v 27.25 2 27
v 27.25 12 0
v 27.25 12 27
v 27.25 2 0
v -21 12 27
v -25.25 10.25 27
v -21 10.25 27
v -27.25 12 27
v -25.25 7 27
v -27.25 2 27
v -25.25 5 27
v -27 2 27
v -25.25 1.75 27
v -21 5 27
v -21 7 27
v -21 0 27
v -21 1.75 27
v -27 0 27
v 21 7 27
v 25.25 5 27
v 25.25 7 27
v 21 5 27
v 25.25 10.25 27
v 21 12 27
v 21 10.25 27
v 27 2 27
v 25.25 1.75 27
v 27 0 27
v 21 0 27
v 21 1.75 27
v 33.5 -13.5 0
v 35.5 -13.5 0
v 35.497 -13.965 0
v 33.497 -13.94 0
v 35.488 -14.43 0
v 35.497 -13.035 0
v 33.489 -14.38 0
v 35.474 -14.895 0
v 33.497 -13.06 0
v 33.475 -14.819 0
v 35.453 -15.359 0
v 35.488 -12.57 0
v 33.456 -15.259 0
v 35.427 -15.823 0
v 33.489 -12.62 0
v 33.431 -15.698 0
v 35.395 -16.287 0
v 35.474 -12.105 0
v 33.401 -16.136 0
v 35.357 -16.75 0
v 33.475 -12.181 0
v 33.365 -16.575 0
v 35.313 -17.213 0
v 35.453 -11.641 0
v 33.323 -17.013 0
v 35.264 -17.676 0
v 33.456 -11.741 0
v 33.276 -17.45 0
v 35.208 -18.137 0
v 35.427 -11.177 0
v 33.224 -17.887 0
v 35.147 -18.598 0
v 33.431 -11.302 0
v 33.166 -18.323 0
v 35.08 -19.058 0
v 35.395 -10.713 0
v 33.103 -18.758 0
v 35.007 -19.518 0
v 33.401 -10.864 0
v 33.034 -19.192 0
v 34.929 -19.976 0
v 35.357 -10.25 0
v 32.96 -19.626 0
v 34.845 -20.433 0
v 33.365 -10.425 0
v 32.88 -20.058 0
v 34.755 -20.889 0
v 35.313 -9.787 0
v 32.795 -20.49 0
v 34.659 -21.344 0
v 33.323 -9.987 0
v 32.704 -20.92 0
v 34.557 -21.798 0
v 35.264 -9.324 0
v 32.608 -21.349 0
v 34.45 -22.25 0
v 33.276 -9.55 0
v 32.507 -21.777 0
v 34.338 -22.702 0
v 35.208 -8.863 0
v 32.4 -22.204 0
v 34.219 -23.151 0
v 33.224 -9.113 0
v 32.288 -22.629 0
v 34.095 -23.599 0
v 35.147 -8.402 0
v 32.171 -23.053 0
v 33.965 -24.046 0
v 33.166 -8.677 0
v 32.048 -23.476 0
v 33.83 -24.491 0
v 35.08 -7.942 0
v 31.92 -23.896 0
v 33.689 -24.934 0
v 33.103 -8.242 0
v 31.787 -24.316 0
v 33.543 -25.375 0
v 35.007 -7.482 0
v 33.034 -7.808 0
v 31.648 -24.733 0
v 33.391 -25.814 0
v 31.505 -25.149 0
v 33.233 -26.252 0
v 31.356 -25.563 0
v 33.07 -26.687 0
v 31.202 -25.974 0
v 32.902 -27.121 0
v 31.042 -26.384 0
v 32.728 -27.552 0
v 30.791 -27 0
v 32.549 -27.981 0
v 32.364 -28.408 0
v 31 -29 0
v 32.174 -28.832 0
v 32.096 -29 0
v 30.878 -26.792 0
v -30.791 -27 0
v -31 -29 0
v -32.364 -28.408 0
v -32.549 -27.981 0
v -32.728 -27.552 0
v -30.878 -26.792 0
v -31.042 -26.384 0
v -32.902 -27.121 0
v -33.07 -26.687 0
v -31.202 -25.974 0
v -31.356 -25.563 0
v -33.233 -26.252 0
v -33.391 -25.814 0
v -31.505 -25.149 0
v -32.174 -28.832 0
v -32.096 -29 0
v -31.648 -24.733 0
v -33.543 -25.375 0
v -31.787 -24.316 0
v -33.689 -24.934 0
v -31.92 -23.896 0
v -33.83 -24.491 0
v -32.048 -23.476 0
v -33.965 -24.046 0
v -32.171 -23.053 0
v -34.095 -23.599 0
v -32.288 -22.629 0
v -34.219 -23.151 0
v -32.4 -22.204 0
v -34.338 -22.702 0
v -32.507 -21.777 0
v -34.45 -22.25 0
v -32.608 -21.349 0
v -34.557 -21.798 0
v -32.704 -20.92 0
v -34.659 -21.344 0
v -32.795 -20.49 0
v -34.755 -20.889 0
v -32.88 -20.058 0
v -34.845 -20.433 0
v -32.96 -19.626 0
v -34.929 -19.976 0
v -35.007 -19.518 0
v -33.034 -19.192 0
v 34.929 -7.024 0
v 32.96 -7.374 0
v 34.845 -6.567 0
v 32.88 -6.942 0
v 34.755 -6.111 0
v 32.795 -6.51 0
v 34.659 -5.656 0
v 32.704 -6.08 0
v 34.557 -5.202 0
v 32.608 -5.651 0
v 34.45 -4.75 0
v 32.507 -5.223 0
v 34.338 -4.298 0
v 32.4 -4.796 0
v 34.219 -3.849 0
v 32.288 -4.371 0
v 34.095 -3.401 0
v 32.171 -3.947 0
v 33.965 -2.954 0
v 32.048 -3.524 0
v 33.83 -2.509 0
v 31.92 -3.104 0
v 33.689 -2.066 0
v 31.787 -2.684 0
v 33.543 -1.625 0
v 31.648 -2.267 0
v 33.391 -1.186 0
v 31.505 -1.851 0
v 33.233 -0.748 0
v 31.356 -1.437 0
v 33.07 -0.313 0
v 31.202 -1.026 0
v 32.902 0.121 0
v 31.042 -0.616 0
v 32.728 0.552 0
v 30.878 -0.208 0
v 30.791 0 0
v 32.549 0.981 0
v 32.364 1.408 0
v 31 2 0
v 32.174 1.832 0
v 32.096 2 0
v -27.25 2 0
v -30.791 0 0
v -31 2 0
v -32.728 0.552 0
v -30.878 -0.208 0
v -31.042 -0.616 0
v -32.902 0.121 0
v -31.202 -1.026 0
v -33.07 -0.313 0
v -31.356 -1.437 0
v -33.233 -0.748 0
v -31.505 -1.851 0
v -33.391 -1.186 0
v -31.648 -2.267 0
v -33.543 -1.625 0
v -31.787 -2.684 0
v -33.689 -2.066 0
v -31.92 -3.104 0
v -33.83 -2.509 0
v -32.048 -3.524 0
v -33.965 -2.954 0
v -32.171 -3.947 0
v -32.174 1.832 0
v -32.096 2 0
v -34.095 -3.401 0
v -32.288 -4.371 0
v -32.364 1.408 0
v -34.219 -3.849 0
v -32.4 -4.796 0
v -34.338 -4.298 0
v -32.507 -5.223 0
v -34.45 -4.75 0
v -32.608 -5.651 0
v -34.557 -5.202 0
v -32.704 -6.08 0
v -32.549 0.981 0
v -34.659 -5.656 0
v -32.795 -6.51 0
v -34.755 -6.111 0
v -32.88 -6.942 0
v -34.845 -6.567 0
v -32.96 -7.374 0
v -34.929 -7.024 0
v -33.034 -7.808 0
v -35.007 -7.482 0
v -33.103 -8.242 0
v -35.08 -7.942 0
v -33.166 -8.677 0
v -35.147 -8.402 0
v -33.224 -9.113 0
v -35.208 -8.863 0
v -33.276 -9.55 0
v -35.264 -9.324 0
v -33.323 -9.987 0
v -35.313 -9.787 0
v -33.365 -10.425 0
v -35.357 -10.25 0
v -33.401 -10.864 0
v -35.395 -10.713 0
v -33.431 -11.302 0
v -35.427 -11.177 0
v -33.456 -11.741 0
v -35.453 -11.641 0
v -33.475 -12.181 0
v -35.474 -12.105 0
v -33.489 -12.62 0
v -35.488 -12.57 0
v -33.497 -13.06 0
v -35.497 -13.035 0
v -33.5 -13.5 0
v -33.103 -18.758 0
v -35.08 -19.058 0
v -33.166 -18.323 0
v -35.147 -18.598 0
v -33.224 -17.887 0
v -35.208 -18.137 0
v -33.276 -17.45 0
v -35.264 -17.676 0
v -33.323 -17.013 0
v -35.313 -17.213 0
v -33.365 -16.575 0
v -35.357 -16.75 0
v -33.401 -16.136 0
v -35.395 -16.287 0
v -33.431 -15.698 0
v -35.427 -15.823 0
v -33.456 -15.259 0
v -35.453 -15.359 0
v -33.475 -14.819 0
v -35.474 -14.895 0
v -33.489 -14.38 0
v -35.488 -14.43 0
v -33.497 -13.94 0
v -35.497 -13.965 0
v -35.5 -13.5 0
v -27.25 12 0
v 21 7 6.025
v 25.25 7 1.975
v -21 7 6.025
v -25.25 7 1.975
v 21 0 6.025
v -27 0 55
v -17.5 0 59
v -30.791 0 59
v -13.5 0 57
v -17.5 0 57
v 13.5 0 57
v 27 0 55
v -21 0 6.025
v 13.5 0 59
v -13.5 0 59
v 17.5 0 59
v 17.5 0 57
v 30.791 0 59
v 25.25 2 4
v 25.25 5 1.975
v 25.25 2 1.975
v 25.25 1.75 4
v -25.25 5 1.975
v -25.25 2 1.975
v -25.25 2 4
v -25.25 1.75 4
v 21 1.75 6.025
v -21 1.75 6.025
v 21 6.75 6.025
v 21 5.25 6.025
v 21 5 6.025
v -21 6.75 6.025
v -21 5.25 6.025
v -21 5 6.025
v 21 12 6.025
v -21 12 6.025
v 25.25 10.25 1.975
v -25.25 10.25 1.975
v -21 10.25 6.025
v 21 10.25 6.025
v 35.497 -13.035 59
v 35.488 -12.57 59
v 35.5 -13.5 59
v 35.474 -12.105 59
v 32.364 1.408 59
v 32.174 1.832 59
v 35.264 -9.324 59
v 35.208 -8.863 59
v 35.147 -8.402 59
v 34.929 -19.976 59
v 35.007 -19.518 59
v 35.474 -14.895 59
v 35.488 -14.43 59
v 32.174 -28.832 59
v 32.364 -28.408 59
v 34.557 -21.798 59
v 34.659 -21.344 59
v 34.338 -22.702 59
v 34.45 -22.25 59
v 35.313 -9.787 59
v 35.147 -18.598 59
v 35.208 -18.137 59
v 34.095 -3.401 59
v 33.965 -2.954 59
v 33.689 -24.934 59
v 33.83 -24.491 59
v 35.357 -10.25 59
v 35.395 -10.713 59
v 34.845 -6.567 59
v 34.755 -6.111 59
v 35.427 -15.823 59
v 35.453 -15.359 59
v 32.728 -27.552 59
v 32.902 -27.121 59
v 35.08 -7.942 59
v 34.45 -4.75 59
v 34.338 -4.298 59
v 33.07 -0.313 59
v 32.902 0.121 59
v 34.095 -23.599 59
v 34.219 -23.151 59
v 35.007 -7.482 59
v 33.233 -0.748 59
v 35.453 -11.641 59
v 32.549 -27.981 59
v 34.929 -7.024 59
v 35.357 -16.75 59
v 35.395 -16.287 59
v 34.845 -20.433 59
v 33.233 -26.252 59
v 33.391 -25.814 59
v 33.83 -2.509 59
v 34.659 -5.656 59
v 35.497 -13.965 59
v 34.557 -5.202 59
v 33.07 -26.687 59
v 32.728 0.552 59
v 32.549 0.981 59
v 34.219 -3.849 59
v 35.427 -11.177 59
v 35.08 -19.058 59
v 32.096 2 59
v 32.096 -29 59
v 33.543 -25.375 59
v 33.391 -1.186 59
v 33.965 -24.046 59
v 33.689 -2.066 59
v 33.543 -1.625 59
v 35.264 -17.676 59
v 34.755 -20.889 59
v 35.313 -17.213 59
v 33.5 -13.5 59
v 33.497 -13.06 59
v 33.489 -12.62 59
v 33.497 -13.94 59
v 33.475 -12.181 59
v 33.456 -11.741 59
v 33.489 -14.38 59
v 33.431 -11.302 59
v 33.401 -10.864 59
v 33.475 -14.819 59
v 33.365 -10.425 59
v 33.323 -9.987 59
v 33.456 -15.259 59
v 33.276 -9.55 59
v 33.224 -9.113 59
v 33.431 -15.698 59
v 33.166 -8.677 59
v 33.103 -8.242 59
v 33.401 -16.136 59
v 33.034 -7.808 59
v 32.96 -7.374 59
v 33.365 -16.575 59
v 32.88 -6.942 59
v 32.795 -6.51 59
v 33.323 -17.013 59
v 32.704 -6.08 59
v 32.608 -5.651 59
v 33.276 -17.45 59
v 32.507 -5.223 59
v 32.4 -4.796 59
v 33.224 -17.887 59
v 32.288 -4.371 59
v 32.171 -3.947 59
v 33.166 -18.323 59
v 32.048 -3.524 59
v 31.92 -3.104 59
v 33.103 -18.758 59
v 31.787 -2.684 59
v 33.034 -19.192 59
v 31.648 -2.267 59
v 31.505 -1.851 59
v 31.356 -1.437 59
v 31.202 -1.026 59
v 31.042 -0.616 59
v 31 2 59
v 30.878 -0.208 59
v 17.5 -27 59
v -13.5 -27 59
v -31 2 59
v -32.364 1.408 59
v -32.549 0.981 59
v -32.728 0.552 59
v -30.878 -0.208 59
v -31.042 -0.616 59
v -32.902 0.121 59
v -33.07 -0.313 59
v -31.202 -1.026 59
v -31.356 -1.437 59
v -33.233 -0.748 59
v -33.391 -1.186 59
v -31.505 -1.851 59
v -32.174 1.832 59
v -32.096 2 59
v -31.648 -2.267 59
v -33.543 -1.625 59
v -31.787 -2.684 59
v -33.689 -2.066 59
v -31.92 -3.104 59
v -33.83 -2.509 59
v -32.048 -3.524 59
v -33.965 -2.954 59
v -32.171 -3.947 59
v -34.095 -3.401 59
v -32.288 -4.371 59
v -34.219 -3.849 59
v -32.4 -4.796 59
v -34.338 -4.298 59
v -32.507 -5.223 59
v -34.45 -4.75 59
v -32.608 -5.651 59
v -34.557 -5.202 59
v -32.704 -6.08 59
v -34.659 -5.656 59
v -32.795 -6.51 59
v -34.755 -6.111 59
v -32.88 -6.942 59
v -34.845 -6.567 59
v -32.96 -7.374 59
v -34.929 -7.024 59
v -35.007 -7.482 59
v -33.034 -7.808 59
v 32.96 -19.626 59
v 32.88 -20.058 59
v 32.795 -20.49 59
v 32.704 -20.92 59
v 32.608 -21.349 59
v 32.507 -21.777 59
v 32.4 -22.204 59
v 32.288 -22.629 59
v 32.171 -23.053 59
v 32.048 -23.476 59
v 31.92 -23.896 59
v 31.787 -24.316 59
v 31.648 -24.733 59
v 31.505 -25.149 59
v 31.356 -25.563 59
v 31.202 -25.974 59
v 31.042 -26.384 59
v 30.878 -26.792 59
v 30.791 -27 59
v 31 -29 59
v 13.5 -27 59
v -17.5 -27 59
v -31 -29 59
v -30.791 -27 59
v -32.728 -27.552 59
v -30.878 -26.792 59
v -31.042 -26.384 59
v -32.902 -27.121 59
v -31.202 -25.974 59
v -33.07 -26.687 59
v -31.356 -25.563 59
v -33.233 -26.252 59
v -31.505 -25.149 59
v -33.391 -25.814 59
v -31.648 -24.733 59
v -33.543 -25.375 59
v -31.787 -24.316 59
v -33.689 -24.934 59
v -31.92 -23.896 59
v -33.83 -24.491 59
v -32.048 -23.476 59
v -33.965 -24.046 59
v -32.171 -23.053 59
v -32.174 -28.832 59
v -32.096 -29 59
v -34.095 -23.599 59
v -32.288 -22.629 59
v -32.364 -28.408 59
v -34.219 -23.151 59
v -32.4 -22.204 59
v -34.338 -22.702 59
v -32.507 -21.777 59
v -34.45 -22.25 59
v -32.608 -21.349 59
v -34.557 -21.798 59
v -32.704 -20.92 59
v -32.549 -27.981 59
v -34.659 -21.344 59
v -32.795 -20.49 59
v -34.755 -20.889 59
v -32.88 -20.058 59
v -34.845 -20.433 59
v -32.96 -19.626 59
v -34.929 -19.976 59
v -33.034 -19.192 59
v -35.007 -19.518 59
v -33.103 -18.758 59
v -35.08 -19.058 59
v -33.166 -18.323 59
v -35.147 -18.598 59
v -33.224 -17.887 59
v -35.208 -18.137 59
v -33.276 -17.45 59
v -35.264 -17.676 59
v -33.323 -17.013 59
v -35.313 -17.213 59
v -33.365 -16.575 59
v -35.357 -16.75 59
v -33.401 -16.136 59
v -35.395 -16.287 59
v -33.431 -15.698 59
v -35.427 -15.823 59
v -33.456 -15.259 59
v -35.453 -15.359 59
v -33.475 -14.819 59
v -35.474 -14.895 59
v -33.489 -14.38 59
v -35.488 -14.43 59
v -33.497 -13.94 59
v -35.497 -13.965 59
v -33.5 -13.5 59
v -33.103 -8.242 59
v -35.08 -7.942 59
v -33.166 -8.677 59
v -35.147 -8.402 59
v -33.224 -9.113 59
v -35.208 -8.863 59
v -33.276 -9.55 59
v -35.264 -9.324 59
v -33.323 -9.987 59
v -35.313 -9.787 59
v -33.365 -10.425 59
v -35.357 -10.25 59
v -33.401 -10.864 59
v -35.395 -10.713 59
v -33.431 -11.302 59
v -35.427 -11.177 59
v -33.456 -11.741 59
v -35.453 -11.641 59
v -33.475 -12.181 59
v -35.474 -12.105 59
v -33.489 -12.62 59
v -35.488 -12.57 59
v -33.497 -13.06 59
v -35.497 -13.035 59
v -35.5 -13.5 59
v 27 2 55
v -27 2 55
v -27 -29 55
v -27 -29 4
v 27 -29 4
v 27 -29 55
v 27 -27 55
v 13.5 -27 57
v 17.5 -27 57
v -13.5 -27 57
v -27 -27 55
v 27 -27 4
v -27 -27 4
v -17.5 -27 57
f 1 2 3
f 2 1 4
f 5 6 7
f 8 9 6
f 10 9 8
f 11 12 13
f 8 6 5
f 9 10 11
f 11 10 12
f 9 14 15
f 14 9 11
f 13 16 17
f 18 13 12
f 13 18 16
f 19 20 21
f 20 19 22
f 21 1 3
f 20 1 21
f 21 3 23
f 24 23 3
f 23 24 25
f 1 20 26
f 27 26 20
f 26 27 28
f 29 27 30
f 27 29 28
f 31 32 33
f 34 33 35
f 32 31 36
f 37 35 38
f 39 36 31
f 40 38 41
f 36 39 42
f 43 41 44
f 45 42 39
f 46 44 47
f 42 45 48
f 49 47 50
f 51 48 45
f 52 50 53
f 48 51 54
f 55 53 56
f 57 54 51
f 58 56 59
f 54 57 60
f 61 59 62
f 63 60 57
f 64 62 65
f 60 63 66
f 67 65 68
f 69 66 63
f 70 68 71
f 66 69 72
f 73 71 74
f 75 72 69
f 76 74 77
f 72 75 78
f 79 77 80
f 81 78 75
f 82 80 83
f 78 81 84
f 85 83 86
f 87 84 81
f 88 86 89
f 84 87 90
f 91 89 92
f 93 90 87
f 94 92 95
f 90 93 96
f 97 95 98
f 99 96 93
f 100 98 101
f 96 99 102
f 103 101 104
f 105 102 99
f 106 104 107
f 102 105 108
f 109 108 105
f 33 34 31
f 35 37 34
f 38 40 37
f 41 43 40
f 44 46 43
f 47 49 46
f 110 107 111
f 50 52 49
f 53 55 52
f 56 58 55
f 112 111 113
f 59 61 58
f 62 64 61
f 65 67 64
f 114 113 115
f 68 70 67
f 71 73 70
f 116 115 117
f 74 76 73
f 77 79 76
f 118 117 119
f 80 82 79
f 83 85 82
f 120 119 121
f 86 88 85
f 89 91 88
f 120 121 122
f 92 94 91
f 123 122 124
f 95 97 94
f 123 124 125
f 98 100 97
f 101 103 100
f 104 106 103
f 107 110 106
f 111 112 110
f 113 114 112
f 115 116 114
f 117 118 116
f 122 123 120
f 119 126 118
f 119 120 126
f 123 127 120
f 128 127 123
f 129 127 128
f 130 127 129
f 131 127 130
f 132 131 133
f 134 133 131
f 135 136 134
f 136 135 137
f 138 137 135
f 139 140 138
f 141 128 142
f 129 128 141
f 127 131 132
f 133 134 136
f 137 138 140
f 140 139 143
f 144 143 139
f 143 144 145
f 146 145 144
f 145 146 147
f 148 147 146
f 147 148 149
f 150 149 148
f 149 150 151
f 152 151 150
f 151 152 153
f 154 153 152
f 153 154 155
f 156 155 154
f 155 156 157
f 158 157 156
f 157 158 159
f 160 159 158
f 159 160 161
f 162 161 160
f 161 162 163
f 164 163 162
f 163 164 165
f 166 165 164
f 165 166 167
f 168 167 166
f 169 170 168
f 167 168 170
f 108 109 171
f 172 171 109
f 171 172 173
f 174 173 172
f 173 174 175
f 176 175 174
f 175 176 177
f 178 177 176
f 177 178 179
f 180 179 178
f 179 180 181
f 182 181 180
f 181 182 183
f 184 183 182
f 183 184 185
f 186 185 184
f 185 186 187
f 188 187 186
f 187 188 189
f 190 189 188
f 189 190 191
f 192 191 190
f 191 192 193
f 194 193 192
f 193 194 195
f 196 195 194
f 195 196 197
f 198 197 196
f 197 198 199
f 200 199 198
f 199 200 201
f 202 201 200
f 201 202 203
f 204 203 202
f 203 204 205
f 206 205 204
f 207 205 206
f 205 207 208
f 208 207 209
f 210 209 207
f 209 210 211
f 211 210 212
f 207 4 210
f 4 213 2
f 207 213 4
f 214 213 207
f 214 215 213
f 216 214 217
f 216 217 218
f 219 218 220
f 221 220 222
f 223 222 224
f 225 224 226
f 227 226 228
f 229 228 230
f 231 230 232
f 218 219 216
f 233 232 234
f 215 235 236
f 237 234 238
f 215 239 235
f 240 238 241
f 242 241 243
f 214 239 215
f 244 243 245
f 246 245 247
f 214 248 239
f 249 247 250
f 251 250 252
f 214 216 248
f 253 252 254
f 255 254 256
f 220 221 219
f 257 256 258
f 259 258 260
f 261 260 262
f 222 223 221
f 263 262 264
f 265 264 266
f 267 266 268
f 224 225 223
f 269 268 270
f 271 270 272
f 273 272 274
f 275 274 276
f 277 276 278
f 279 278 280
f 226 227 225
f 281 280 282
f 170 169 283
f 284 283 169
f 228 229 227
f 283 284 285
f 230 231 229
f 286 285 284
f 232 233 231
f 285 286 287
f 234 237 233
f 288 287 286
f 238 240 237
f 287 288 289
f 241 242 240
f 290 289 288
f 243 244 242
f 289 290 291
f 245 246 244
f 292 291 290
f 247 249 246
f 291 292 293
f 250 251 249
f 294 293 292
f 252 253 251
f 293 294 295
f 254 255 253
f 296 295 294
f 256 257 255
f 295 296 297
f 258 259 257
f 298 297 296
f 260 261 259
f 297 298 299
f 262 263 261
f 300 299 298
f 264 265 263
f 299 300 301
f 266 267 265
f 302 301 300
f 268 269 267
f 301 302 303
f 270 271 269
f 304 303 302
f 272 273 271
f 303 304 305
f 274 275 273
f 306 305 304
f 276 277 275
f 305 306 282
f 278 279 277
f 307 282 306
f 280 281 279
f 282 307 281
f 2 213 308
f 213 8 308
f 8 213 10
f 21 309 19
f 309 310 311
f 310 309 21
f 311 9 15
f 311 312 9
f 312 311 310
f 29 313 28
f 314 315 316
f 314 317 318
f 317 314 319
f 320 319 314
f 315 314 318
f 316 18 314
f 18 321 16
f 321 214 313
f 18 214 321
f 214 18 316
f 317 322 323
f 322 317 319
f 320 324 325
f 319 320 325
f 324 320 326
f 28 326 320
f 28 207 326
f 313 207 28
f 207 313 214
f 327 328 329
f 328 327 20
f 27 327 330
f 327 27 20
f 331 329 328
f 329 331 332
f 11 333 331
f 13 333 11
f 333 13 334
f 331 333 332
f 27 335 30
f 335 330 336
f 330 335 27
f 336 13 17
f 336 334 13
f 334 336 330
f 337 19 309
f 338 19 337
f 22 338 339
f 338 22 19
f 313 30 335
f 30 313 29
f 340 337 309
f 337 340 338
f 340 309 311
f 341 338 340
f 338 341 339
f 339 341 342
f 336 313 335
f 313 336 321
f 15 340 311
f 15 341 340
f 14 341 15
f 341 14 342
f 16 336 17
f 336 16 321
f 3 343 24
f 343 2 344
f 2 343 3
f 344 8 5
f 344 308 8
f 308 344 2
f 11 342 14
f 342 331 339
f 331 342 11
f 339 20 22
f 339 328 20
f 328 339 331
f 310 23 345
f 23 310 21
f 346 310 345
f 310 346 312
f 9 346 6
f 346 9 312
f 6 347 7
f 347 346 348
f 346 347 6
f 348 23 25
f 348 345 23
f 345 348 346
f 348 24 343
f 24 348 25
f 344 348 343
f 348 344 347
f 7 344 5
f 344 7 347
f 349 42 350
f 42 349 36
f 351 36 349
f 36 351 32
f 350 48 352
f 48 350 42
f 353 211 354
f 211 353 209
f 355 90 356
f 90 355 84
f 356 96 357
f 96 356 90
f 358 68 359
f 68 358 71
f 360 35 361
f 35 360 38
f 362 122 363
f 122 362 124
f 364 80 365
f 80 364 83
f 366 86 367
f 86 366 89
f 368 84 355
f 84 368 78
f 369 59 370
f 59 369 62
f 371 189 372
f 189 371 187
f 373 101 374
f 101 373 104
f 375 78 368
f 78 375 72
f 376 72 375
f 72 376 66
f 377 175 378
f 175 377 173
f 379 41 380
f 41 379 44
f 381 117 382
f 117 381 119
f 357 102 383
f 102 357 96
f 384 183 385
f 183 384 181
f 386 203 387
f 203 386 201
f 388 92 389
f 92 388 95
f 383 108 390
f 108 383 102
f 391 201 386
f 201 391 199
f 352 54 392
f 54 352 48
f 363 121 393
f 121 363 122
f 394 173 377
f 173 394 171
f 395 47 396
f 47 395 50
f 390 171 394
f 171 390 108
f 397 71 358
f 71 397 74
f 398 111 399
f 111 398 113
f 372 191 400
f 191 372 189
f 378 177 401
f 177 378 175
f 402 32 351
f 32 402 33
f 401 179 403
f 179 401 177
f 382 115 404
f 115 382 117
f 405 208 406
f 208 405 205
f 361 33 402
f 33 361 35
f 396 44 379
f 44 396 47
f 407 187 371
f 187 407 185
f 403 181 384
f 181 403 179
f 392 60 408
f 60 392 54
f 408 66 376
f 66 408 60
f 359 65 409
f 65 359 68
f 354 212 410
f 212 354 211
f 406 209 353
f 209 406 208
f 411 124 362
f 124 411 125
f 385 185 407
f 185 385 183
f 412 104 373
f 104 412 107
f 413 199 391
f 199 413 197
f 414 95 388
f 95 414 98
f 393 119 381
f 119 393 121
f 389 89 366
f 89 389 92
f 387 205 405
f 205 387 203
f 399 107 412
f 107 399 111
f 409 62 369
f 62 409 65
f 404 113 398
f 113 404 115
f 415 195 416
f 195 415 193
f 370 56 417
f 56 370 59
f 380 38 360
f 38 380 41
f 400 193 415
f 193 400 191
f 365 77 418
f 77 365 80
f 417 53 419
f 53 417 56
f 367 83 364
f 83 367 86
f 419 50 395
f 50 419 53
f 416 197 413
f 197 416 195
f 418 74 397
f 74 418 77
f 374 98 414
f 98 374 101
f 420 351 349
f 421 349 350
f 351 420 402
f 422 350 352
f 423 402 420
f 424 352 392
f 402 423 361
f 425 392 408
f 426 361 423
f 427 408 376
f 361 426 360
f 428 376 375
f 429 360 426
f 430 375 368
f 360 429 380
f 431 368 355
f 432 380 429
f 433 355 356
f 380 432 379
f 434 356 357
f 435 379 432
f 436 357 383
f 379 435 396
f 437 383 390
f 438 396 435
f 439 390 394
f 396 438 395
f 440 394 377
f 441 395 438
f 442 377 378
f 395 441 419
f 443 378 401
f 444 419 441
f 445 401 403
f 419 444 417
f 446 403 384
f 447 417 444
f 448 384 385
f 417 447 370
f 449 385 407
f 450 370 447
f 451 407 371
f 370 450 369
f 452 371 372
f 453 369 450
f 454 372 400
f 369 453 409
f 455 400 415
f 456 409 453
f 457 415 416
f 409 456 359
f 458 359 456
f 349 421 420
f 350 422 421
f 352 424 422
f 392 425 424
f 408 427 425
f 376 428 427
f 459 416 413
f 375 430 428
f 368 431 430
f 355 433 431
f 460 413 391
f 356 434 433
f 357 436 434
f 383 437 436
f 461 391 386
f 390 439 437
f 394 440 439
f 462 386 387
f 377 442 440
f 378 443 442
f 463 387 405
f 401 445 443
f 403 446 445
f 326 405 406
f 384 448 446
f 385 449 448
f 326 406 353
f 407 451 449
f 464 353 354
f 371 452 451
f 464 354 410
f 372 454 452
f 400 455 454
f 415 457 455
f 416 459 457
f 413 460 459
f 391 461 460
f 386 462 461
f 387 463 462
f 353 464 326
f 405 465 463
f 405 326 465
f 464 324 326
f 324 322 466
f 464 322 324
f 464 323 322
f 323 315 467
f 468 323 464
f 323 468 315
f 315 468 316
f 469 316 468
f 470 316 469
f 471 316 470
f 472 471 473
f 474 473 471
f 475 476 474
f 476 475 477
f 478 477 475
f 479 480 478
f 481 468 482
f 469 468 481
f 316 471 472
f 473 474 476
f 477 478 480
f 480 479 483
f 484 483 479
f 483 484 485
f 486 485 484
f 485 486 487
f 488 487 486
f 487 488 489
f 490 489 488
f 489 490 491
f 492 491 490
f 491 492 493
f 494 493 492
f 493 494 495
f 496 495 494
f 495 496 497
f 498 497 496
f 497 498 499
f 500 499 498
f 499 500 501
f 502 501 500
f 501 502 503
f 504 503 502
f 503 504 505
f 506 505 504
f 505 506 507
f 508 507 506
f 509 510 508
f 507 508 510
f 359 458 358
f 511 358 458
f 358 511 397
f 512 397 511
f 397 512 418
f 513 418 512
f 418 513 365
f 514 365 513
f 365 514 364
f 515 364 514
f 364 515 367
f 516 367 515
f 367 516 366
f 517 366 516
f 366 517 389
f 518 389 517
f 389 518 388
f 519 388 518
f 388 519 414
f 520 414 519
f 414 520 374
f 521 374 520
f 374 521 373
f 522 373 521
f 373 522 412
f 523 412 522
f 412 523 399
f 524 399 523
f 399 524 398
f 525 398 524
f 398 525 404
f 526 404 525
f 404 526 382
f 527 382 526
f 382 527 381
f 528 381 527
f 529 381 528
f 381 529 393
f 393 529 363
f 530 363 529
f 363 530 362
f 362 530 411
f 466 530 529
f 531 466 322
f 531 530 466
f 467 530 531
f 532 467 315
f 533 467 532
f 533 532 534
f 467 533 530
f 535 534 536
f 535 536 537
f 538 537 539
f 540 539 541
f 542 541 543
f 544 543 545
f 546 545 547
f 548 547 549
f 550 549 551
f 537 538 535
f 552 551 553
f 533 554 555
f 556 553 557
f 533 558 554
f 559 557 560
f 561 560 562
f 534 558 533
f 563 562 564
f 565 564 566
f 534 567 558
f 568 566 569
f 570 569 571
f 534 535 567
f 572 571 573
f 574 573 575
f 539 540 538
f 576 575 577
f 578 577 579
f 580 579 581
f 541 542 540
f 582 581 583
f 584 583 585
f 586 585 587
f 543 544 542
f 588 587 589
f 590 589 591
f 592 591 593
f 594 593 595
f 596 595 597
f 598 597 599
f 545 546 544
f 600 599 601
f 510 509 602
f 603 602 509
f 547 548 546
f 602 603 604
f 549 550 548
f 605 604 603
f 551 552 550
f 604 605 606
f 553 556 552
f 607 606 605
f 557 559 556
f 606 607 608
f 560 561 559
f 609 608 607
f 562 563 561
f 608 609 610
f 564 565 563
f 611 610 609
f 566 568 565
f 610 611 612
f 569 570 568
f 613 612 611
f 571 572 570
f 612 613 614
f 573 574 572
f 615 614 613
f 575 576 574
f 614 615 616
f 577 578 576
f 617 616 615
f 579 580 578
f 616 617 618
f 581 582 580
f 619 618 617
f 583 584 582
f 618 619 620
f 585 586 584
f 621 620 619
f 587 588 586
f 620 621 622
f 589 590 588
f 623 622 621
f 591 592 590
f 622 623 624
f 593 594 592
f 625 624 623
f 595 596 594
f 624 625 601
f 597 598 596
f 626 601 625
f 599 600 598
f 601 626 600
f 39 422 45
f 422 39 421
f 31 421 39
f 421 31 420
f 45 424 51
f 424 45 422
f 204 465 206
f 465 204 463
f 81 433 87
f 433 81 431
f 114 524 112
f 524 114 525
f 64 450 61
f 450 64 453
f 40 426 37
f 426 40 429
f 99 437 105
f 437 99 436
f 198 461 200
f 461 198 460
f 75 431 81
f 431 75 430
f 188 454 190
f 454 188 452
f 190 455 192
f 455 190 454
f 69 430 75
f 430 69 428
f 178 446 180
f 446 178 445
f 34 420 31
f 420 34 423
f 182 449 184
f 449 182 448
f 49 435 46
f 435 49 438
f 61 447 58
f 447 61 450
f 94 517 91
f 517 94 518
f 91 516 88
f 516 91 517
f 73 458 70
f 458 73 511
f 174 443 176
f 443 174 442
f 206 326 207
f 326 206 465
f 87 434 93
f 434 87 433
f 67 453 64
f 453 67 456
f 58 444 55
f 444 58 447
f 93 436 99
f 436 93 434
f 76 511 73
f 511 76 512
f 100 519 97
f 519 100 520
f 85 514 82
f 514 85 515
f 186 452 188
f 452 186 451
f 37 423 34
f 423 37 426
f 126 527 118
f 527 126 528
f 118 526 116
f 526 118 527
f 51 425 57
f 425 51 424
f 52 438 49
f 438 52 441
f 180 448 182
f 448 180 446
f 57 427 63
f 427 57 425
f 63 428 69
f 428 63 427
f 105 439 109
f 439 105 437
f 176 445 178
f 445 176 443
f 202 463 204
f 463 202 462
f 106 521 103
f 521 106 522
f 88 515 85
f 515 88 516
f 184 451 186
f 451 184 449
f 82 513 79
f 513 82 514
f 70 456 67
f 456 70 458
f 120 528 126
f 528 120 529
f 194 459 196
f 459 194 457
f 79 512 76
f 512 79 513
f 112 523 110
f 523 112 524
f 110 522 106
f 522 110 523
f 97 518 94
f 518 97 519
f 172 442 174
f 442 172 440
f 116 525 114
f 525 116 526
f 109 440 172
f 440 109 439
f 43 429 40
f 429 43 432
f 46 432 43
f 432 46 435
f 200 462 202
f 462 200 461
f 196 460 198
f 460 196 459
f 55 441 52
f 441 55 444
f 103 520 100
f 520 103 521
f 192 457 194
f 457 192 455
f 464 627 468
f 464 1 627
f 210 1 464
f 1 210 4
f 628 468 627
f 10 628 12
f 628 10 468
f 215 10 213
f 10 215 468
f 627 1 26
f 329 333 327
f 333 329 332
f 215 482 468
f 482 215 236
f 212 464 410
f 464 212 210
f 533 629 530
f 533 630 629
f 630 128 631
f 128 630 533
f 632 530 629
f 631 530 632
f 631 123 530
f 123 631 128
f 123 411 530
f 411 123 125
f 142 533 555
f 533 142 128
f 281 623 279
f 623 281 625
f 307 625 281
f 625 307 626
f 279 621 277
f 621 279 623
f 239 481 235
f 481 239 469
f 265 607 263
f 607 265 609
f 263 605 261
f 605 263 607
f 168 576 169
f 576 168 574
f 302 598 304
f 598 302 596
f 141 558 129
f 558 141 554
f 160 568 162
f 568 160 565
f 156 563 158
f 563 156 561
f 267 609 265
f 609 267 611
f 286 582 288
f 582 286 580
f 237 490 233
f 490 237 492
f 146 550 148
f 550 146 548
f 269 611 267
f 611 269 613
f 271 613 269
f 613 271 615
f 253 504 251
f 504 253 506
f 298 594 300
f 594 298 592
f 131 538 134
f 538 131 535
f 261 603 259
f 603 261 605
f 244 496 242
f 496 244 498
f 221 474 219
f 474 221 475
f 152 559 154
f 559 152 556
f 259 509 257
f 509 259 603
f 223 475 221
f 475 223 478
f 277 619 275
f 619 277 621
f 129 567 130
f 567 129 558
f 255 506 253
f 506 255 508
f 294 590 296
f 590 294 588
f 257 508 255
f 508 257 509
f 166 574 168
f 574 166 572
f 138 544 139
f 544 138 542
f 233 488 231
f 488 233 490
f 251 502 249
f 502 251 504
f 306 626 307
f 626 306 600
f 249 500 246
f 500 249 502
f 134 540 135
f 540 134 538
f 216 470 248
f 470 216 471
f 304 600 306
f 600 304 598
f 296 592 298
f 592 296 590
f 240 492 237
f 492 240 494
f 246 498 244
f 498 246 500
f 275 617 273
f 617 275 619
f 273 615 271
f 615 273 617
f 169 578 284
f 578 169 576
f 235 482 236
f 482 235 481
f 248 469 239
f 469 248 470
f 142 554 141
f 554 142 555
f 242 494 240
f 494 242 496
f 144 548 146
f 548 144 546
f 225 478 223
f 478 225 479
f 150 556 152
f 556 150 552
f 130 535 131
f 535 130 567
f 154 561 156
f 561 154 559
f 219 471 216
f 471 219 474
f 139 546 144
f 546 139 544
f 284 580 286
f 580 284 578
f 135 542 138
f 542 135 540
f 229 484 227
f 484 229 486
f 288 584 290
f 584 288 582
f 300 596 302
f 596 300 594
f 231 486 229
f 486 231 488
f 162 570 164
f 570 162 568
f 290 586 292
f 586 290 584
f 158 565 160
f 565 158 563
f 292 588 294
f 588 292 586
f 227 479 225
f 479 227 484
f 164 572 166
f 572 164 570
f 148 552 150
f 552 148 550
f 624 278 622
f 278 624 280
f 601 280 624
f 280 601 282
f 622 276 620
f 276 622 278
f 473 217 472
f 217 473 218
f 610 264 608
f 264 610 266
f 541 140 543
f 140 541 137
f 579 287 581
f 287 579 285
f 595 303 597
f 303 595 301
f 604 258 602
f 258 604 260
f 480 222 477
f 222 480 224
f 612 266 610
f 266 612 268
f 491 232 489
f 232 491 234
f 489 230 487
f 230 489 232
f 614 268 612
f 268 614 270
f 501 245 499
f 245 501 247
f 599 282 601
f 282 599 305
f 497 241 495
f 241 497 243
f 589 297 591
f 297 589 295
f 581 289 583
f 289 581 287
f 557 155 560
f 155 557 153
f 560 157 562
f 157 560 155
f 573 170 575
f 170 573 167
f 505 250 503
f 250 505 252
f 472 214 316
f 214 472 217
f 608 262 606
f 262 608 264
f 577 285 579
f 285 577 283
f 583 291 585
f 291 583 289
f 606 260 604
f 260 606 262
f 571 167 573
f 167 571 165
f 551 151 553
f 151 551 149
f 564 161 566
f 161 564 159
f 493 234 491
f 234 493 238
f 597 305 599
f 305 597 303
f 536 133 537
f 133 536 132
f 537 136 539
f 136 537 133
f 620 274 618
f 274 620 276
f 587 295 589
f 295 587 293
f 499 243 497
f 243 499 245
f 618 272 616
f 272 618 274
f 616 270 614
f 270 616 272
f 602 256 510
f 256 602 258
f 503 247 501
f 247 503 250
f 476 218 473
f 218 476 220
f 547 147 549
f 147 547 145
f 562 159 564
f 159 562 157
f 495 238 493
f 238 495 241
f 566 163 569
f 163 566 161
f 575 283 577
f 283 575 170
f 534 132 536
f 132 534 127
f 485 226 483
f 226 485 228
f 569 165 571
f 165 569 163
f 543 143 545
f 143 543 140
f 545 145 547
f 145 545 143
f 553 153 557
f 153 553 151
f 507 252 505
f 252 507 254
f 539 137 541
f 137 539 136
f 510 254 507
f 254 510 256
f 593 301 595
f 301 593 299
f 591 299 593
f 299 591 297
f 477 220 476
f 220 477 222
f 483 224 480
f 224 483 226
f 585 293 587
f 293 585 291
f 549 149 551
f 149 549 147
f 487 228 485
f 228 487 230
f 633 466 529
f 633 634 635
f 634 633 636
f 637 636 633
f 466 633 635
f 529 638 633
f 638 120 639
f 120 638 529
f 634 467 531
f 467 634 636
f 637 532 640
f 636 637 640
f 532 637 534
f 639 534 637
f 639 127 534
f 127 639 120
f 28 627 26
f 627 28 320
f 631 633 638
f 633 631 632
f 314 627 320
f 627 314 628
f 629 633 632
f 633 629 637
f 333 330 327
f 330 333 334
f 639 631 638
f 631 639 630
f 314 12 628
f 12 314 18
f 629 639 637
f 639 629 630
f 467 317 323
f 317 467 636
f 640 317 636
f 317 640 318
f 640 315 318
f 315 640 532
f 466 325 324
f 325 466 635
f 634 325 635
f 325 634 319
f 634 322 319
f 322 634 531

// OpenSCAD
$fn = 500;

eps = 0.05;

//frameHolder
    diaLength = 50;
    diaThick = 3;
    extraSpace = 0.25;

    holderThick = 2;
    sideHeight = 25;
    midHeight = 4;    


//detectorBox
    dbWidth = 61 + 4*extraSpace; //outer
    dbMaxWidth = 66 + 4*extraSpace; //inner
    dbThick = 26 + 4*extraSpace;
    dbRadius = 35;
    dbRoof = 1; //roof on top
    dbHeight = 54 + dbRoof + 2 *holderThick;


frameHolder();
detectorBox();

module detectorBox() {

    translate([0, -dbThick / 2, dbHeight / 2]) {
        union() {
            difference() {

                union() {
                    translate([0,dbThick / 2 + holderThick / 2, 0])
                        cube(size=[dbWidth, holderThick, dbHeight], center=true);

                    translate([0, -dbThick / 2 - holderThick / 2, 0])
                        cube(size=[dbWidth, holderThick, dbHeight], center=true);

                    detectorSide();

                    mirror([1, 0, 0]) {
                        detectorSide();
                    }

                }

                cube([dbWidth - 4 * holderThick, dbThick + 2 * holderThick + eps, dbHeight - 4 * holderThick ], center = true);
            }

            translate([-dbWidth / 4, 0, dbHeight / 2 - holderThick / 2]) {
                cube(size=[2 * holderThick, dbThick + 2 * holderThick, holderThick], center=true);
            }
            translate([dbWidth / 4, 0, dbHeight / 2 - holderThick / 2]) {
                cube(size=[2 * holderThick, dbThick + 2 * holderThick, holderThick], center=true);
            }
        }
            
    }

}

module detectorSide() {

    translate([-dbRadius + dbMaxWidth / 2,0,0])
    difference() {
        cylinder(r=dbRadius + holderThick, h=dbHeight, center=true);

        cylinder(r=dbRadius, h=dbHeight + eps, center=true);

        translate([0, dbRadius + dbThick / 2 + holderThick, 0])
            cube(size=[2* dbWidth, 2 * dbRadius, dbHeight + eps], center=true);

        translate([0, -(dbRadius + dbThick / 2 + holderThick), 0])
            cube(size=[2* dbWidth, 2 * dbRadius, dbHeight + eps], center=true);

        translate([-dbWidth, 0, 0])
            cube(size=[2* dbWidth, 2 * dbRadius, dbHeight + eps], center=true);
    }
}

module slit() {


    length = 2 * holderThick + 2 * extraSpace + diaLength;
    width = diaThick + 2 * holderThick;
    height = holderThick + sideHeight;


    difference() {
        translate([0, 0, height / 2])
            cube([length, width, height], center = true);

        translate([0, 0, sideHeight / 2 + holderThick])
            cube([diaLength + 2*extraSpace, diaThick + 2 * extraSpace, sideHeight + eps], center = true);

        translate([0,0, (sideHeight - midHeight) / 2 + holderThick + midHeight + eps])
            cube([diaLength - 2 * midHeight, width + eps, sideHeight - midHeight + eps], center = true);

    }
}

module frameHolder() {
    
    frameHolderWidth = diaThick +  holderThick;


    union() {
        translate([0, frameHolderWidth - holderThick + 2* extraSpace, 0])
            slit();

        translate([0, 2* frameHolderWidth - holderThick + 2* extraSpace, 0])
            slit();
    }

}    
